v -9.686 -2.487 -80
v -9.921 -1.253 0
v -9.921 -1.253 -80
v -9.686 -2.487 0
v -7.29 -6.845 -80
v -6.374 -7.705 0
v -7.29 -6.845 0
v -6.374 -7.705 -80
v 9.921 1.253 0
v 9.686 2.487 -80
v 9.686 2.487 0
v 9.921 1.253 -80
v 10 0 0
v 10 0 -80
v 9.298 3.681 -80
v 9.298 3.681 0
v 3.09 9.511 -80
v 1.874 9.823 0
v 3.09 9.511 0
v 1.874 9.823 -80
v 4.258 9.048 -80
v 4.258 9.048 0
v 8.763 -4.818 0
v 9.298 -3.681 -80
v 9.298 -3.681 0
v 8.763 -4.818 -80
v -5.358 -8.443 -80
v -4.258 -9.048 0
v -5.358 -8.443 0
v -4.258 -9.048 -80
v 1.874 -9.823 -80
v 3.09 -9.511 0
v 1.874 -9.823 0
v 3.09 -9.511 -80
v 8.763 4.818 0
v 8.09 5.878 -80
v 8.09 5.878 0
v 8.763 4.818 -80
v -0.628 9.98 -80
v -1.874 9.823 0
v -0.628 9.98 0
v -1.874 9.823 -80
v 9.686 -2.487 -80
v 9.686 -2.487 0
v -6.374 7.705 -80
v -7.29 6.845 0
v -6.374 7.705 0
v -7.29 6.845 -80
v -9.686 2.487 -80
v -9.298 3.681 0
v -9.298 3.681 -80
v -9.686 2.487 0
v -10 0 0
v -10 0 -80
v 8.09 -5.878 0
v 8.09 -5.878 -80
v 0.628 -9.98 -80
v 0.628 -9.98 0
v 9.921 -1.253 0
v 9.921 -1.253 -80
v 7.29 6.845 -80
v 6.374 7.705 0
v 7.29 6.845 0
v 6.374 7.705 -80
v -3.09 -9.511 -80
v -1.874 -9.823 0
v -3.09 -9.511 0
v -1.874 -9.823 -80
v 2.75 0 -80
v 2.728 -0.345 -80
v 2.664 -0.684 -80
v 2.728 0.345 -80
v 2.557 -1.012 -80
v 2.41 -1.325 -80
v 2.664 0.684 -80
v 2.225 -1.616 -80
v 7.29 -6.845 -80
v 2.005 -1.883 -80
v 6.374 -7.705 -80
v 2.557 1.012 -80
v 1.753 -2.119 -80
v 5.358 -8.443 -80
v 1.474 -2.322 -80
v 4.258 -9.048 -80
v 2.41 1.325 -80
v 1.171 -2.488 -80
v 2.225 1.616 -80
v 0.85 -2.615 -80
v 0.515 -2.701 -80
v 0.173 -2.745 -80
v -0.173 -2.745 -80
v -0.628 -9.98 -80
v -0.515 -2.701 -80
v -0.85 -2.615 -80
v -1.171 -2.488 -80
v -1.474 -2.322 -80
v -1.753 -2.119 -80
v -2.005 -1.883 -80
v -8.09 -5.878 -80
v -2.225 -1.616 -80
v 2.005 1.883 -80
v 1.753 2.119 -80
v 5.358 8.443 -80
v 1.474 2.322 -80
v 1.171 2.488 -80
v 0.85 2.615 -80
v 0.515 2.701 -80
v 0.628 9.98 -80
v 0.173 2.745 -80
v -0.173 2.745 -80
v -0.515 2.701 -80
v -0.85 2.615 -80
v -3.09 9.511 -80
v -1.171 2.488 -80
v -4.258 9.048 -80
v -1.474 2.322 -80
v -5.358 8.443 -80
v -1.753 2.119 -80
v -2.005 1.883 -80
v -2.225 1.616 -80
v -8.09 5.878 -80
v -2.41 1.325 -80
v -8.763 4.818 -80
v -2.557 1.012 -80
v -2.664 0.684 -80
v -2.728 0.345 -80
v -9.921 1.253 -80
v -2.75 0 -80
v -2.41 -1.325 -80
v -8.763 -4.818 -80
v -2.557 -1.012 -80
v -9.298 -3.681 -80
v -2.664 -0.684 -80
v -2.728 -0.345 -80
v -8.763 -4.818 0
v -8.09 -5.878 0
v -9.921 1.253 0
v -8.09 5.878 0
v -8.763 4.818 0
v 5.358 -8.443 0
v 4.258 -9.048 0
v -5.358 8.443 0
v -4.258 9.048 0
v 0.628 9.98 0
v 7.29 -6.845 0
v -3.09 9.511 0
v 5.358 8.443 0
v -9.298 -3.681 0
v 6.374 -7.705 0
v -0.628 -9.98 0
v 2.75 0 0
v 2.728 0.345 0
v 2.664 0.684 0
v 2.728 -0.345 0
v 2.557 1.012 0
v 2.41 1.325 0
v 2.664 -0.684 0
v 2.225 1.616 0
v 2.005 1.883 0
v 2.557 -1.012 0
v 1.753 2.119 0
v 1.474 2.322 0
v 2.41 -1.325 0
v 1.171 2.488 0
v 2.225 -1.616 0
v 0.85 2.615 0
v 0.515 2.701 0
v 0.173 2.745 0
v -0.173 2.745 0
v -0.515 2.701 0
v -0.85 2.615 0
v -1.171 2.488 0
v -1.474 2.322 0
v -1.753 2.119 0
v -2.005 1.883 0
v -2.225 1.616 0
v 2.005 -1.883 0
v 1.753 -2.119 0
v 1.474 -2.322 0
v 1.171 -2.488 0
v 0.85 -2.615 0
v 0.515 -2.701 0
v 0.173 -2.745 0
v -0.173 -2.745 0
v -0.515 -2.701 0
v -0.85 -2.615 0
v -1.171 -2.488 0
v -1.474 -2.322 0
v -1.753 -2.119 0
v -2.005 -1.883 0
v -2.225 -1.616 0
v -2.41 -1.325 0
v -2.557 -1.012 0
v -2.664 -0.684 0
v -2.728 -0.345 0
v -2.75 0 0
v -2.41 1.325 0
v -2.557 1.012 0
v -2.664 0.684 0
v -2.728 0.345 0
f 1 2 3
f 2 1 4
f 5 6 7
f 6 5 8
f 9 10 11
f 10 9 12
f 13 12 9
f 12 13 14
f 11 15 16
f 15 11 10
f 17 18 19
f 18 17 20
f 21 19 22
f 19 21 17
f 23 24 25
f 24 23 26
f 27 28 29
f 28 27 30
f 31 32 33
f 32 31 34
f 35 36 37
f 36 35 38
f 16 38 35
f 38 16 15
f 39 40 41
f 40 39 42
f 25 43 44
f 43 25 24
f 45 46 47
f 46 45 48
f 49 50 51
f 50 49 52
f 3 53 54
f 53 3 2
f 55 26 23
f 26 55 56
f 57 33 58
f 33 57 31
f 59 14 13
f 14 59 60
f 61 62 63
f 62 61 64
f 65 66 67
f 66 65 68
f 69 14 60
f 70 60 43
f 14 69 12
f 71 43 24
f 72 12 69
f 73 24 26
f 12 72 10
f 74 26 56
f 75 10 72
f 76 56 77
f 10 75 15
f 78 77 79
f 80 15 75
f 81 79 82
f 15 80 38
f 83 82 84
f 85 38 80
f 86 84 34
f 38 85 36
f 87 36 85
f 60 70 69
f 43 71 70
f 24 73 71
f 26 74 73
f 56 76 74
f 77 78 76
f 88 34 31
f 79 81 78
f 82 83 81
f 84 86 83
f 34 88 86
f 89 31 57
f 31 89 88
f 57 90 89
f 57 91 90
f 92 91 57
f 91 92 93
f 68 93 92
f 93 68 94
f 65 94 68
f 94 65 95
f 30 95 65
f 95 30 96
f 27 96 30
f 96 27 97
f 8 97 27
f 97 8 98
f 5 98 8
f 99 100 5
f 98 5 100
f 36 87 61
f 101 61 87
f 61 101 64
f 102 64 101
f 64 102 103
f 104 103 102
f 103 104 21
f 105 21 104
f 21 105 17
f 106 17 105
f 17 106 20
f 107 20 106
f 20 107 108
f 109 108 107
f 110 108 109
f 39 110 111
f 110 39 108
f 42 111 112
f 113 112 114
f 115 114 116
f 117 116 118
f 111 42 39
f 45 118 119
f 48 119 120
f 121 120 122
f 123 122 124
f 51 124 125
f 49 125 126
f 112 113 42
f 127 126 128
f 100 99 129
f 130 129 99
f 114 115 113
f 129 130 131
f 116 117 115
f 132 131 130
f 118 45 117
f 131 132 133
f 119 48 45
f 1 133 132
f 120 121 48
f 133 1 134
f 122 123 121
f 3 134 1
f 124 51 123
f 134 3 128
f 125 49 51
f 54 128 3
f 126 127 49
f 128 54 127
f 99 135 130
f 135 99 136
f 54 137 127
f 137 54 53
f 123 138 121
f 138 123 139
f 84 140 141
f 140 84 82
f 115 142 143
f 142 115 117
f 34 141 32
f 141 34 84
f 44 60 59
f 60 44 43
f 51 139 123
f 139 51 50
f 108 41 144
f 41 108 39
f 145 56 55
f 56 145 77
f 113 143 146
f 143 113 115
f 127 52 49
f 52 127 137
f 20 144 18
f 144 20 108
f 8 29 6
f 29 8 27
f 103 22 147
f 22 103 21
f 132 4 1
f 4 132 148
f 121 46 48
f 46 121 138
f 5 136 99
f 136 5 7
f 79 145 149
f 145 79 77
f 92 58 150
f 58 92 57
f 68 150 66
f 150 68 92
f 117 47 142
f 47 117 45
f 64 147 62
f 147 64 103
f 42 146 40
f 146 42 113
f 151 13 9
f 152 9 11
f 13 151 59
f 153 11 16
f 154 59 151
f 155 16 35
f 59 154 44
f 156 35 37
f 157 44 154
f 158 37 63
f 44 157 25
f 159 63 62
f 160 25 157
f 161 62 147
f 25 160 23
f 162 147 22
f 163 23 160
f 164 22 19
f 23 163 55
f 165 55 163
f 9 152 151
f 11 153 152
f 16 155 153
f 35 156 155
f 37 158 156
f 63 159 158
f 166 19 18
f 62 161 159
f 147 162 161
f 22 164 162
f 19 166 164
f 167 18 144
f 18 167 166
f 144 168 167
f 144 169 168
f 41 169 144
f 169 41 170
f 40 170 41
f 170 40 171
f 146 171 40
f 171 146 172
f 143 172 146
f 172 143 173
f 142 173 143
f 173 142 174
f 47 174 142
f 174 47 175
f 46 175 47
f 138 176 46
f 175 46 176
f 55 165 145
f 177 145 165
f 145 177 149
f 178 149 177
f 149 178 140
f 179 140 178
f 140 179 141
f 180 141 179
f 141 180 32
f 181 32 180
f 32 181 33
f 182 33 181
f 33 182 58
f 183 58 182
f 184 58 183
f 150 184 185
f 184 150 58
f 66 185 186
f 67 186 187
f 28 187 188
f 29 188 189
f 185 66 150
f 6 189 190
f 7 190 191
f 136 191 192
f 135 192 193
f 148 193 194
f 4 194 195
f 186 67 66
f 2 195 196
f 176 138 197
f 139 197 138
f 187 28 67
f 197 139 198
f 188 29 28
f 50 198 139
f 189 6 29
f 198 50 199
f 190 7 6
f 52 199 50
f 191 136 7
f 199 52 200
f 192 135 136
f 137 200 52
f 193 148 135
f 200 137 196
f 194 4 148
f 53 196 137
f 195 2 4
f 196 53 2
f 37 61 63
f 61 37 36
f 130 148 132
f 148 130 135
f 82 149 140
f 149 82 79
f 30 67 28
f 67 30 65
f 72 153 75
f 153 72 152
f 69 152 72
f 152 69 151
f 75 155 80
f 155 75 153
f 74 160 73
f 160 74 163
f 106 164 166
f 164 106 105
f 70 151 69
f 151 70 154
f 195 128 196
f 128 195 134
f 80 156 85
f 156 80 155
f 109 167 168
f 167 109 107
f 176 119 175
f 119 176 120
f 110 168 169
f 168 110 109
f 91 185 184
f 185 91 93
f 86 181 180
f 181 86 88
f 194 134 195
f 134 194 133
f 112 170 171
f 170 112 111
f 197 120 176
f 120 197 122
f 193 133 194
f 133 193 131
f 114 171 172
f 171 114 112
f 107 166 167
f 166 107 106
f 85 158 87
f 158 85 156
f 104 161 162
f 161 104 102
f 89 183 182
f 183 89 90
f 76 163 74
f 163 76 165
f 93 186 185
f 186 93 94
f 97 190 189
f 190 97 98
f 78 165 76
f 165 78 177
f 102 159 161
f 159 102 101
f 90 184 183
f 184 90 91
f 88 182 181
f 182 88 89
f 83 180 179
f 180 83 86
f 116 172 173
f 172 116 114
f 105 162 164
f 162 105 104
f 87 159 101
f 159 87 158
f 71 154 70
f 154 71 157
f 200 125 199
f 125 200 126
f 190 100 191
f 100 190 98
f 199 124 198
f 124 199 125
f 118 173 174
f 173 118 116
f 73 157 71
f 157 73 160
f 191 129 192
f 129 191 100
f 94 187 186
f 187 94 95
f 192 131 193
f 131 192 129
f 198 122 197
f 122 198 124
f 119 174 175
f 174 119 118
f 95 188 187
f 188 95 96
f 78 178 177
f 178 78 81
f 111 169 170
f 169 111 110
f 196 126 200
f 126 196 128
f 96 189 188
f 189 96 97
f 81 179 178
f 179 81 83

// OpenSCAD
$fn = 50;


difference() {
	union() {
		translate(v = [0, 0, -80.0000000000]) {
			cylinder(h = 80, r = 10.0000000000);
		}
	}
	union() {
		#translate(v = [0, 0, -80]) {
			cylinder(h = 80, r = 2.7500000000);
		}
	}
}
